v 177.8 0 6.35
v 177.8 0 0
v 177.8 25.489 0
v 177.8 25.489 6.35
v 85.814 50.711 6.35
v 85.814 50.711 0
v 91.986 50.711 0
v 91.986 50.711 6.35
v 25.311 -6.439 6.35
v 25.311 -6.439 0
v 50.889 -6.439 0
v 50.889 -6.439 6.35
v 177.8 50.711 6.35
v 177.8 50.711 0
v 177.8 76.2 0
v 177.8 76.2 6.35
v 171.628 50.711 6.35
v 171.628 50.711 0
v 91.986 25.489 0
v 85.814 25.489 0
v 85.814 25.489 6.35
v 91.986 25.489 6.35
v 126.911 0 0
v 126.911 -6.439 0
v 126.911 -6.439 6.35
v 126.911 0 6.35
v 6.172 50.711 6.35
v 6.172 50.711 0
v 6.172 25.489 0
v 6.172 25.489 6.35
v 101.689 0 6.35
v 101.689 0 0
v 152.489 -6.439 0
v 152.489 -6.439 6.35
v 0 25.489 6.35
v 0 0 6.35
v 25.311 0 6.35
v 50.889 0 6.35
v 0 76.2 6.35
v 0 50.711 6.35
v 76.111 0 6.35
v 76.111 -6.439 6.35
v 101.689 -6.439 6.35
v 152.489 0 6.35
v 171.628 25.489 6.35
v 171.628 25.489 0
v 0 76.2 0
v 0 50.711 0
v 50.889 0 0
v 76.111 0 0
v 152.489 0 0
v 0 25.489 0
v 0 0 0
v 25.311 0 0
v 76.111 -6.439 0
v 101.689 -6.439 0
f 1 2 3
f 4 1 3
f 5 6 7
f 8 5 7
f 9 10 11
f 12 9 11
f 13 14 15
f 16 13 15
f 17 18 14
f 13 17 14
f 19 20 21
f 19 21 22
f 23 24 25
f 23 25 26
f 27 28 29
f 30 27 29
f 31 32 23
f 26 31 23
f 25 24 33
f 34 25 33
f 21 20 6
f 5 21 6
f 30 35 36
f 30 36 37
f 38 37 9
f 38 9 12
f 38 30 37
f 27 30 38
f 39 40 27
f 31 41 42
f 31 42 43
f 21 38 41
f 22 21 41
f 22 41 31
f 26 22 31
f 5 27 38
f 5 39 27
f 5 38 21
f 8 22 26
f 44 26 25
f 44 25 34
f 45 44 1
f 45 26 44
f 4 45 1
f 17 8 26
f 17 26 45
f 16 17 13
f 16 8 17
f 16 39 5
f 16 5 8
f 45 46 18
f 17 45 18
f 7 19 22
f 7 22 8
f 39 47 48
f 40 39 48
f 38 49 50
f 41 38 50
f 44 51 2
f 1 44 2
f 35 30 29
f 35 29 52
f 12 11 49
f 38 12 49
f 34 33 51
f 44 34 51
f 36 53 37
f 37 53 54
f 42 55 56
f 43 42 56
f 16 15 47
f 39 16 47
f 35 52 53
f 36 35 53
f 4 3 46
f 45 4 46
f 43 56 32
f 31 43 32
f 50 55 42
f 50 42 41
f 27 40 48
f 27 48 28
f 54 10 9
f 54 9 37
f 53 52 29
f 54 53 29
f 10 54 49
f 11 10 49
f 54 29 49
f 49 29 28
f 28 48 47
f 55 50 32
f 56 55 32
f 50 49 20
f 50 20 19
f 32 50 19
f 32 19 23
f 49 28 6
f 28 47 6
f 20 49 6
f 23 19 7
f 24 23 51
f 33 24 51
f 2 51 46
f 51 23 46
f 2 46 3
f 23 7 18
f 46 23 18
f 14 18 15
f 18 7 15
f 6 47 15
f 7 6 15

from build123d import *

# Parameters (mm, degrees)
F0_W     = 6.1722
F0_H     = 25.2222
F0_W_2   = 25.5778
F0_H_2   = 6.4389
F1_DEPTH = 6.35


with BuildPart() as f1:
    # F0 (on Top) → F1 (new body)
    with BuildSketch(Plane.XY):
        Polygon((0, 25.4889), (0, 0), (25.3111, 0), (50.8889, 0), (76.1111, 0), (101.6889, 0), (126.9111, 0), (152.4889, 0), (177.8, 0), (177.8, 25.4889), (171.6278, 25.4889), (171.6278, 50.7111), (177.8, 50.7111), (177.8, 76.2), (0, 76.2), (0, 50.7111), (6.1722, 50.7111), (6.1722, 25.4889), align=None)
        with Locations((88.9, 38.1)):
            Rectangle(F0_W, F0_H, mode=Mode.SUBTRACT)
        with Locations((38.1, -3.21945)):
            Rectangle(F0_W_2, F0_H_2)
        with Locations((88.9, -3.21945)):
            Rectangle(F0_W_2, F0_H_2)
        with Locations((139.7, -3.21945)):
            Rectangle(F0_W_2, F0_H_2)
    extrude(amount=F1_DEPTH)


solid = f1.part
